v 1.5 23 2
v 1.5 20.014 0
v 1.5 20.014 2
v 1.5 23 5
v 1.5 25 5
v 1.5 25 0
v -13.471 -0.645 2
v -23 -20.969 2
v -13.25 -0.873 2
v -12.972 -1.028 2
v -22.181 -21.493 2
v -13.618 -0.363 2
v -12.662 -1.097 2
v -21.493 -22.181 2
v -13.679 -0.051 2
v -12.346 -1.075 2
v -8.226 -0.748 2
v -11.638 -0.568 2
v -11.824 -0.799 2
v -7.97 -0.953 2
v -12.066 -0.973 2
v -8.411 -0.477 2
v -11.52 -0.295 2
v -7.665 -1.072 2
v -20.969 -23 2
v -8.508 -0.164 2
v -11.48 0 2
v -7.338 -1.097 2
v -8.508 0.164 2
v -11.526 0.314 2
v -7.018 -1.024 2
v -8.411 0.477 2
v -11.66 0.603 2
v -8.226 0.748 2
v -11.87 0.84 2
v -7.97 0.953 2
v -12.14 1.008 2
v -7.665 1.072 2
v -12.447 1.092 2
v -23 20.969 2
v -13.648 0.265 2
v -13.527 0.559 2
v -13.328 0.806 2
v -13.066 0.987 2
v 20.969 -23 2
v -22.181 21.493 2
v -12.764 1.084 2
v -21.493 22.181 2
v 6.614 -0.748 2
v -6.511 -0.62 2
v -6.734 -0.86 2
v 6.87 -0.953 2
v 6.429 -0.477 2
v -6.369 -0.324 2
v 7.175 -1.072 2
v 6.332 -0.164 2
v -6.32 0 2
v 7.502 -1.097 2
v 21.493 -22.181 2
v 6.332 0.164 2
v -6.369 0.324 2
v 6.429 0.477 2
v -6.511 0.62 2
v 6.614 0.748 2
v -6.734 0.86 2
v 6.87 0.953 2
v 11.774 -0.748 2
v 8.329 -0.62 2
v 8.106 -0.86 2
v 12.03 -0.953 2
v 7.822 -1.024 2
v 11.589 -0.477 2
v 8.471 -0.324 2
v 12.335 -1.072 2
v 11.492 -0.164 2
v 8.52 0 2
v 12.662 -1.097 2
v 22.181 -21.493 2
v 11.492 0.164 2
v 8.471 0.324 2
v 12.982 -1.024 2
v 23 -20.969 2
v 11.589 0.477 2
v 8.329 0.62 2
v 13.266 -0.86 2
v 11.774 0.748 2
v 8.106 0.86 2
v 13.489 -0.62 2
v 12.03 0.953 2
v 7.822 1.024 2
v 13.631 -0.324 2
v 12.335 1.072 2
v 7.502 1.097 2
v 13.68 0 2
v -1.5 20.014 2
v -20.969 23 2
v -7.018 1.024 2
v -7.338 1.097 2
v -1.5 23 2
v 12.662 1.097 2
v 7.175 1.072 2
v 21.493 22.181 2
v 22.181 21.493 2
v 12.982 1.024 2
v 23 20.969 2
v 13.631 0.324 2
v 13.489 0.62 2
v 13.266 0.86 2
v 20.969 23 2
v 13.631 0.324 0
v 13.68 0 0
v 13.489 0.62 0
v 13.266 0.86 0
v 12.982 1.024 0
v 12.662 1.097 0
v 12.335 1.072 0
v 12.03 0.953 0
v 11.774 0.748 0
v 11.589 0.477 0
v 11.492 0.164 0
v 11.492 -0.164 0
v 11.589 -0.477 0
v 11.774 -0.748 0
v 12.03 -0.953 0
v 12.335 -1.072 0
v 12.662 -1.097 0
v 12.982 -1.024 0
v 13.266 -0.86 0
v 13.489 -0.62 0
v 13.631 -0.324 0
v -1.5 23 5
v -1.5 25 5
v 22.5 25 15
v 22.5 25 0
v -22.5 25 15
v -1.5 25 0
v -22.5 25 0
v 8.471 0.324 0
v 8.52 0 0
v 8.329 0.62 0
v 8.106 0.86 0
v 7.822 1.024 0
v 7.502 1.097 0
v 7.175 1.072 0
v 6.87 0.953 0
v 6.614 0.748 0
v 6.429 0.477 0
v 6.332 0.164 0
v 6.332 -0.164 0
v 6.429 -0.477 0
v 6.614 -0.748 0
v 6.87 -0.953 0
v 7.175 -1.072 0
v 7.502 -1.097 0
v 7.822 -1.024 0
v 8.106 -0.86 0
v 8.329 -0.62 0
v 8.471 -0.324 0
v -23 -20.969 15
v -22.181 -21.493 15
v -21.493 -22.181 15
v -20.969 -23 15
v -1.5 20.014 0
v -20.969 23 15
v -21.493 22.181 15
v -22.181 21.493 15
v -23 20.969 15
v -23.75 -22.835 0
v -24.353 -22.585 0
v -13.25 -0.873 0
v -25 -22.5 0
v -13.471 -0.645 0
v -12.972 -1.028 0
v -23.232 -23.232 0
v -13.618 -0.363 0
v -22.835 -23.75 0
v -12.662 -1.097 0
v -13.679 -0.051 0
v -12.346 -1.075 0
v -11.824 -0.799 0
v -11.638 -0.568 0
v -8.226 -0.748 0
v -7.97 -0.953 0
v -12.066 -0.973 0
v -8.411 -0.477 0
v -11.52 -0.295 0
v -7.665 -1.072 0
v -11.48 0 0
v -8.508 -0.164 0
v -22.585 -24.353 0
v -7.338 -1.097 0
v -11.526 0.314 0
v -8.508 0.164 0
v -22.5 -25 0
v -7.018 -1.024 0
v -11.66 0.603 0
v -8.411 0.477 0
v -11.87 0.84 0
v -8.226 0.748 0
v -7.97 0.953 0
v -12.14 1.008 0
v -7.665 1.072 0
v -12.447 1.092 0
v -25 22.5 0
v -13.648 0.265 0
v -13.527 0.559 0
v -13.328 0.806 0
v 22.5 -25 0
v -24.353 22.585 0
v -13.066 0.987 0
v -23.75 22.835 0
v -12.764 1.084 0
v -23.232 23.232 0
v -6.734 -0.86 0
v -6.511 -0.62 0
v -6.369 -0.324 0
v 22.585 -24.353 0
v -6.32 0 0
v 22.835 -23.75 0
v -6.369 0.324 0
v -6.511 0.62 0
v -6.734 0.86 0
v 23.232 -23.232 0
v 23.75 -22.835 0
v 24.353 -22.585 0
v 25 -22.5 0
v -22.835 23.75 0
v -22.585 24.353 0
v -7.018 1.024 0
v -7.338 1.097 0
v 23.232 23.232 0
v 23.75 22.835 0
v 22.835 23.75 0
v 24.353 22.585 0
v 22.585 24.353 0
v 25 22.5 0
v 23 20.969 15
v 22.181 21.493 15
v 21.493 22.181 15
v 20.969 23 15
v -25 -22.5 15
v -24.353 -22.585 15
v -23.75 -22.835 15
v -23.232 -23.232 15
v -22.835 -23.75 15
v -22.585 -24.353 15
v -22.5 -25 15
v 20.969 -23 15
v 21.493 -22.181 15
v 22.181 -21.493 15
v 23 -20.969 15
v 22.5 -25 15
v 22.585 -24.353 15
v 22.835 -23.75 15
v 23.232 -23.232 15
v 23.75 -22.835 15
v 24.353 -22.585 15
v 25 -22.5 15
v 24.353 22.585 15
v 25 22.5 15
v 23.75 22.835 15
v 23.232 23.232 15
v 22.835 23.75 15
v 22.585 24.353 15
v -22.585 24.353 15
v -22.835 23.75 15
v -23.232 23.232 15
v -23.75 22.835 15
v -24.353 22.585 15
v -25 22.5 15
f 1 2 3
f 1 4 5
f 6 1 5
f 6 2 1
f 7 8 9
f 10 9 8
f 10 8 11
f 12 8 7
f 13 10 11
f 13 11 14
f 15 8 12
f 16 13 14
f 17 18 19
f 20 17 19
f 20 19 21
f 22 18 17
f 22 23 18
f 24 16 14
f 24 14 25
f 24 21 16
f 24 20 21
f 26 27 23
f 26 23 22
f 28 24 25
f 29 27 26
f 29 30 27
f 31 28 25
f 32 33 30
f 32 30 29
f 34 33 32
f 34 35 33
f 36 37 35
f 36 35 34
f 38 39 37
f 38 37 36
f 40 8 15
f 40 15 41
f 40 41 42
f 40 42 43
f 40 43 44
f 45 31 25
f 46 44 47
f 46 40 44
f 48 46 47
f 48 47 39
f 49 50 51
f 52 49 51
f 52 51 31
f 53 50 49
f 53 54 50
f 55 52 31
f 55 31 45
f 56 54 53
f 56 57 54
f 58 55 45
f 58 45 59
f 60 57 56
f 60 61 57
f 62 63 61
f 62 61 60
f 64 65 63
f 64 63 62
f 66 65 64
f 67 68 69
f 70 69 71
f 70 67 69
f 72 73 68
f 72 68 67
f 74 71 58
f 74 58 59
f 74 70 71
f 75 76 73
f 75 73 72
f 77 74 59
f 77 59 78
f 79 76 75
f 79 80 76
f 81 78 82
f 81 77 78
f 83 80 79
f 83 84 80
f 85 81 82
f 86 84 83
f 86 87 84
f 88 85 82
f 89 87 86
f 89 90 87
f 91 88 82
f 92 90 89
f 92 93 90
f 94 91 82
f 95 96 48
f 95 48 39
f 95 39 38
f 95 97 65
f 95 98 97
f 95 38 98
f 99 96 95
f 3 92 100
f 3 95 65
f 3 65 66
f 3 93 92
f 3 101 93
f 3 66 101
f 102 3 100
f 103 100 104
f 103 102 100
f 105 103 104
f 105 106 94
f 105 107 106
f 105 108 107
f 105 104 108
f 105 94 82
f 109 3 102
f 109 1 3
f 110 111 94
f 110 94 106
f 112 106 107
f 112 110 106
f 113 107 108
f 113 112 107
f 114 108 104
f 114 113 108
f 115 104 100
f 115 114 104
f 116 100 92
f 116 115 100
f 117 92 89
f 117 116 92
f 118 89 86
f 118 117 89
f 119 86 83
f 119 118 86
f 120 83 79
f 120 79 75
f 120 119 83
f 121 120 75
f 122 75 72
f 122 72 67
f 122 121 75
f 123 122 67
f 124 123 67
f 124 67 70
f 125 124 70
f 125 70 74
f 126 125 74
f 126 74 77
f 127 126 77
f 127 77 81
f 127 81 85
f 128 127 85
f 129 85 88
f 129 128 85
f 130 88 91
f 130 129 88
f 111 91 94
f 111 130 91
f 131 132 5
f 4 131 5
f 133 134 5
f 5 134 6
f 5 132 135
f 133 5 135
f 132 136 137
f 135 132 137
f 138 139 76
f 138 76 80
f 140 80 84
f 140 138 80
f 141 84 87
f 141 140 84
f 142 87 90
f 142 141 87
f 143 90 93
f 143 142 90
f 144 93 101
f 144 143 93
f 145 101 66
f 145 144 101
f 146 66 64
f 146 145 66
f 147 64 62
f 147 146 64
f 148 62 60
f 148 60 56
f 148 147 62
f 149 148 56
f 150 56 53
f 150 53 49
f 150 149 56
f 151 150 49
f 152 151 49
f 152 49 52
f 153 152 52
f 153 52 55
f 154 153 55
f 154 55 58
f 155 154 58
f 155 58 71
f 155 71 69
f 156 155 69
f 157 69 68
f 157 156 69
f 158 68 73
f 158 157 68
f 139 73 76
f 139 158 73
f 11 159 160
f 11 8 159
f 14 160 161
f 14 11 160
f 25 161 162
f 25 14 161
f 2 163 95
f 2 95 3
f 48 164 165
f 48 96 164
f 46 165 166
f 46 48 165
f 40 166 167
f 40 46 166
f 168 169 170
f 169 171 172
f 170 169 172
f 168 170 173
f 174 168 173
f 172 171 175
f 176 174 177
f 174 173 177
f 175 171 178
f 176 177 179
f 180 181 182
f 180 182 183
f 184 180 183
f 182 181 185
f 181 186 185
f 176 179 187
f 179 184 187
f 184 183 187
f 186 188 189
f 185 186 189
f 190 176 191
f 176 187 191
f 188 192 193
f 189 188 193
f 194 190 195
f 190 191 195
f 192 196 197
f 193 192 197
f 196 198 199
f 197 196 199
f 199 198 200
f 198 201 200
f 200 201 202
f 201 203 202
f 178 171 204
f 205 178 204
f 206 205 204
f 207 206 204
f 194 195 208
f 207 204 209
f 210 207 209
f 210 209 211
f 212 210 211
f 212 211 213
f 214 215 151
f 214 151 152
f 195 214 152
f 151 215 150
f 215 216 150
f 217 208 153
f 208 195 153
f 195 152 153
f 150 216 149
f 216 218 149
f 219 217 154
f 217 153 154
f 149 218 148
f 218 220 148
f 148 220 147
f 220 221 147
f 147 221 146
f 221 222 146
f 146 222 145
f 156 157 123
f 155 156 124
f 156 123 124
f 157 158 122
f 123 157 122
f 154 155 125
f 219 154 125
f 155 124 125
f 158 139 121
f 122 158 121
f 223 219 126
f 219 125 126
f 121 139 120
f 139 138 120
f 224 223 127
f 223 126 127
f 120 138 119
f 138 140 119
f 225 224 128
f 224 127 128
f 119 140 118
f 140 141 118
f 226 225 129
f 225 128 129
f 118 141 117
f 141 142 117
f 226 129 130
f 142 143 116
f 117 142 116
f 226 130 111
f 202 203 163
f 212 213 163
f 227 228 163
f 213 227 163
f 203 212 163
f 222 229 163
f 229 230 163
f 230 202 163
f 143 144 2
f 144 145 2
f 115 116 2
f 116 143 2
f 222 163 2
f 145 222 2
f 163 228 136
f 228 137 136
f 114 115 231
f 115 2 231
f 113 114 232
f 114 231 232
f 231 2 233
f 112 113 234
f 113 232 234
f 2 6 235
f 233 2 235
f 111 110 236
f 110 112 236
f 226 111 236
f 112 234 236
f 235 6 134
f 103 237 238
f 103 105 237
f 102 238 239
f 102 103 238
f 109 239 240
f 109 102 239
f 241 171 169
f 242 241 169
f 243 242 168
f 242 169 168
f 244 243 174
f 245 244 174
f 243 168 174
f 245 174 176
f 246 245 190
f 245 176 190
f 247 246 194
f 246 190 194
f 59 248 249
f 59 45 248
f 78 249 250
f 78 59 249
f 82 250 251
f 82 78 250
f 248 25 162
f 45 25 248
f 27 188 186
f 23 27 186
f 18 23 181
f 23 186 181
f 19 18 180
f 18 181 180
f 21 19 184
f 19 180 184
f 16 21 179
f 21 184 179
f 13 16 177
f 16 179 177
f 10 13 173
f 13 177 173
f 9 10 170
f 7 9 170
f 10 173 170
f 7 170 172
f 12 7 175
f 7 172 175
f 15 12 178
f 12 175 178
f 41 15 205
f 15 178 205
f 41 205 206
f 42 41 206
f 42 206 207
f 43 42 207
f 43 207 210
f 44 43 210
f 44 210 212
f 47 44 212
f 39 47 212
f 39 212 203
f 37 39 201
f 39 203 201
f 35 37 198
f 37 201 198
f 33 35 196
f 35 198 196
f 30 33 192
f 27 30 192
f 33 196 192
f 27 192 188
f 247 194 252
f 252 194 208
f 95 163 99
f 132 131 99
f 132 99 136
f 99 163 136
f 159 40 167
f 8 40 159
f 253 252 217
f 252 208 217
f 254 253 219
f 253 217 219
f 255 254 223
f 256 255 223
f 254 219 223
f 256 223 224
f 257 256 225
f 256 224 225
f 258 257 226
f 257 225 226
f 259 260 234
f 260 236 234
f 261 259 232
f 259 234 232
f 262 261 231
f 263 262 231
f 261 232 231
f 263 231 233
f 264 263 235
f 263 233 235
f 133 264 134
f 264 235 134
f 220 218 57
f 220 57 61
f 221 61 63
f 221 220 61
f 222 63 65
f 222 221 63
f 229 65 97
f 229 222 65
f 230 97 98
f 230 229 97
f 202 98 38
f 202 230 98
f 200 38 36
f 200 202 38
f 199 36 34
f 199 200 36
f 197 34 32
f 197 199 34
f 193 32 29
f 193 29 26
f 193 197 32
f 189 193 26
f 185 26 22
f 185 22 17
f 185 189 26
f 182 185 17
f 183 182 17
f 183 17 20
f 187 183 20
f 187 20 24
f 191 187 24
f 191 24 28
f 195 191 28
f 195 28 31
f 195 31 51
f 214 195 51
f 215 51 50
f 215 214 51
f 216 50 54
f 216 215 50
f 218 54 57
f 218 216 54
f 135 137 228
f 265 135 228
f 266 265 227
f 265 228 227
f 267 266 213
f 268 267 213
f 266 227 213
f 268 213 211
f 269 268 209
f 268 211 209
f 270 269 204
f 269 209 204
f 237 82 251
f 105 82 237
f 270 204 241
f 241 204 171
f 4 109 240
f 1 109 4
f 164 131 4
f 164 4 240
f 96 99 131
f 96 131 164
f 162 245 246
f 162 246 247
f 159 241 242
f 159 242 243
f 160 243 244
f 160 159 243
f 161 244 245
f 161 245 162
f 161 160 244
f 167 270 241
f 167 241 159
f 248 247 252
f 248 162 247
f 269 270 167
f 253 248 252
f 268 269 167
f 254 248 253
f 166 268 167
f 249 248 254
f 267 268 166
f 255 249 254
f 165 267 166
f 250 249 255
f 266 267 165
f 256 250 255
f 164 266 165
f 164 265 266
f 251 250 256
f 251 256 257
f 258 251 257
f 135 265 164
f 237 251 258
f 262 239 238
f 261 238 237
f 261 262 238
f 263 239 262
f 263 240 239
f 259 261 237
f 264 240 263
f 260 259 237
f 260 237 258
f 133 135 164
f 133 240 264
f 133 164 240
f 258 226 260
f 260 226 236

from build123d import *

# Parameters (mm, degrees)
F0_R     = 1.1
F1_DEPTH = 5
F2_DEPTH = 10
F3_T     = -2
F4_W     = 3
F4_H     = 10
F5_DEPTH = 5


with BuildPart() as f1:
    # F0 (on Top) → F1 (new body)
    with BuildSketch(Plane.XY):
        with BuildLine():
            Line((-22.5, -25), (22.5, -25))
            ThreePointArc((22.5, -25), (23.232233047, -23.232233047), (25, -22.5))
            Line((25, -22.5), (25, 22.5))
            ThreePointArc((25, 22.5), (23.232233047, 23.232233047), (22.5, 25))
            Line((22.5, 25), (-22.5, 25))
            ThreePointArc((-22.5, 25), (-23.232233047, 23.232233047), (-25, 22.5))
            Line((-25, 22.5), (-25, -22.5))
            ThreePointArc((-25, -22.5), (-23.232233047, -23.232233047), (-22.5, -25))
        make_face()
        with BuildLine():
            ThreePointArc((-12.345503876, -1.0747146448), (-13.4367221651, 0.6899471949), (-11.48, 0))
            ThreePointArc((-11.48, 0), (-11.7232778349, -0.6899471949), (-12.345503876, -1.0747146448))
        make_face(mode=Mode.SUBTRACT)
        with Locations((-7.42, 0)):
            Circle(F0_R, mode=Mode.SUBTRACT)
        with Locations((7.42, 0)):
            Circle(F0_R, mode=Mode.SUBTRACT)
        with Locations((12.58, 0)):
            Circle(F0_R, mode=Mode.SUBTRACT)
    extrude(amount=F1_DEPTH)

    # F2 (add): a face of the model
    f2_faces = [f1.faces().sort_by_distance(p)[0] for p in [
        (0, 0, 5),
    ]]
    extrude(f2_faces, amount=F2_DEPTH)

    # F3
    f3_openings = [f1.faces().sort_by_distance(p)[0] for p in [
        (-13.68, 0, 2.5),
        (-13.68, 0, 10),
        (0, 0, 15),
        (11.48, 0, 2.5),
        (11.48, 0, 10),
        (6.32, 0, 2.5),
        (6.32, 0, 10),
        (-8.52, 0, 2.5),
        (-8.52, 0, 10),
    ]]
    offset(amount=F3_T, openings=f3_openings)

    # F4 (on Top) → F5 (cut)
    with BuildSketch(Plane.XY):
        with Locations((0, 25.013813749)):
            Rectangle(F4_W, F4_H)
    extrude(amount=F5_DEPTH, mode=Mode.SUBTRACT)


solid = f1.part
